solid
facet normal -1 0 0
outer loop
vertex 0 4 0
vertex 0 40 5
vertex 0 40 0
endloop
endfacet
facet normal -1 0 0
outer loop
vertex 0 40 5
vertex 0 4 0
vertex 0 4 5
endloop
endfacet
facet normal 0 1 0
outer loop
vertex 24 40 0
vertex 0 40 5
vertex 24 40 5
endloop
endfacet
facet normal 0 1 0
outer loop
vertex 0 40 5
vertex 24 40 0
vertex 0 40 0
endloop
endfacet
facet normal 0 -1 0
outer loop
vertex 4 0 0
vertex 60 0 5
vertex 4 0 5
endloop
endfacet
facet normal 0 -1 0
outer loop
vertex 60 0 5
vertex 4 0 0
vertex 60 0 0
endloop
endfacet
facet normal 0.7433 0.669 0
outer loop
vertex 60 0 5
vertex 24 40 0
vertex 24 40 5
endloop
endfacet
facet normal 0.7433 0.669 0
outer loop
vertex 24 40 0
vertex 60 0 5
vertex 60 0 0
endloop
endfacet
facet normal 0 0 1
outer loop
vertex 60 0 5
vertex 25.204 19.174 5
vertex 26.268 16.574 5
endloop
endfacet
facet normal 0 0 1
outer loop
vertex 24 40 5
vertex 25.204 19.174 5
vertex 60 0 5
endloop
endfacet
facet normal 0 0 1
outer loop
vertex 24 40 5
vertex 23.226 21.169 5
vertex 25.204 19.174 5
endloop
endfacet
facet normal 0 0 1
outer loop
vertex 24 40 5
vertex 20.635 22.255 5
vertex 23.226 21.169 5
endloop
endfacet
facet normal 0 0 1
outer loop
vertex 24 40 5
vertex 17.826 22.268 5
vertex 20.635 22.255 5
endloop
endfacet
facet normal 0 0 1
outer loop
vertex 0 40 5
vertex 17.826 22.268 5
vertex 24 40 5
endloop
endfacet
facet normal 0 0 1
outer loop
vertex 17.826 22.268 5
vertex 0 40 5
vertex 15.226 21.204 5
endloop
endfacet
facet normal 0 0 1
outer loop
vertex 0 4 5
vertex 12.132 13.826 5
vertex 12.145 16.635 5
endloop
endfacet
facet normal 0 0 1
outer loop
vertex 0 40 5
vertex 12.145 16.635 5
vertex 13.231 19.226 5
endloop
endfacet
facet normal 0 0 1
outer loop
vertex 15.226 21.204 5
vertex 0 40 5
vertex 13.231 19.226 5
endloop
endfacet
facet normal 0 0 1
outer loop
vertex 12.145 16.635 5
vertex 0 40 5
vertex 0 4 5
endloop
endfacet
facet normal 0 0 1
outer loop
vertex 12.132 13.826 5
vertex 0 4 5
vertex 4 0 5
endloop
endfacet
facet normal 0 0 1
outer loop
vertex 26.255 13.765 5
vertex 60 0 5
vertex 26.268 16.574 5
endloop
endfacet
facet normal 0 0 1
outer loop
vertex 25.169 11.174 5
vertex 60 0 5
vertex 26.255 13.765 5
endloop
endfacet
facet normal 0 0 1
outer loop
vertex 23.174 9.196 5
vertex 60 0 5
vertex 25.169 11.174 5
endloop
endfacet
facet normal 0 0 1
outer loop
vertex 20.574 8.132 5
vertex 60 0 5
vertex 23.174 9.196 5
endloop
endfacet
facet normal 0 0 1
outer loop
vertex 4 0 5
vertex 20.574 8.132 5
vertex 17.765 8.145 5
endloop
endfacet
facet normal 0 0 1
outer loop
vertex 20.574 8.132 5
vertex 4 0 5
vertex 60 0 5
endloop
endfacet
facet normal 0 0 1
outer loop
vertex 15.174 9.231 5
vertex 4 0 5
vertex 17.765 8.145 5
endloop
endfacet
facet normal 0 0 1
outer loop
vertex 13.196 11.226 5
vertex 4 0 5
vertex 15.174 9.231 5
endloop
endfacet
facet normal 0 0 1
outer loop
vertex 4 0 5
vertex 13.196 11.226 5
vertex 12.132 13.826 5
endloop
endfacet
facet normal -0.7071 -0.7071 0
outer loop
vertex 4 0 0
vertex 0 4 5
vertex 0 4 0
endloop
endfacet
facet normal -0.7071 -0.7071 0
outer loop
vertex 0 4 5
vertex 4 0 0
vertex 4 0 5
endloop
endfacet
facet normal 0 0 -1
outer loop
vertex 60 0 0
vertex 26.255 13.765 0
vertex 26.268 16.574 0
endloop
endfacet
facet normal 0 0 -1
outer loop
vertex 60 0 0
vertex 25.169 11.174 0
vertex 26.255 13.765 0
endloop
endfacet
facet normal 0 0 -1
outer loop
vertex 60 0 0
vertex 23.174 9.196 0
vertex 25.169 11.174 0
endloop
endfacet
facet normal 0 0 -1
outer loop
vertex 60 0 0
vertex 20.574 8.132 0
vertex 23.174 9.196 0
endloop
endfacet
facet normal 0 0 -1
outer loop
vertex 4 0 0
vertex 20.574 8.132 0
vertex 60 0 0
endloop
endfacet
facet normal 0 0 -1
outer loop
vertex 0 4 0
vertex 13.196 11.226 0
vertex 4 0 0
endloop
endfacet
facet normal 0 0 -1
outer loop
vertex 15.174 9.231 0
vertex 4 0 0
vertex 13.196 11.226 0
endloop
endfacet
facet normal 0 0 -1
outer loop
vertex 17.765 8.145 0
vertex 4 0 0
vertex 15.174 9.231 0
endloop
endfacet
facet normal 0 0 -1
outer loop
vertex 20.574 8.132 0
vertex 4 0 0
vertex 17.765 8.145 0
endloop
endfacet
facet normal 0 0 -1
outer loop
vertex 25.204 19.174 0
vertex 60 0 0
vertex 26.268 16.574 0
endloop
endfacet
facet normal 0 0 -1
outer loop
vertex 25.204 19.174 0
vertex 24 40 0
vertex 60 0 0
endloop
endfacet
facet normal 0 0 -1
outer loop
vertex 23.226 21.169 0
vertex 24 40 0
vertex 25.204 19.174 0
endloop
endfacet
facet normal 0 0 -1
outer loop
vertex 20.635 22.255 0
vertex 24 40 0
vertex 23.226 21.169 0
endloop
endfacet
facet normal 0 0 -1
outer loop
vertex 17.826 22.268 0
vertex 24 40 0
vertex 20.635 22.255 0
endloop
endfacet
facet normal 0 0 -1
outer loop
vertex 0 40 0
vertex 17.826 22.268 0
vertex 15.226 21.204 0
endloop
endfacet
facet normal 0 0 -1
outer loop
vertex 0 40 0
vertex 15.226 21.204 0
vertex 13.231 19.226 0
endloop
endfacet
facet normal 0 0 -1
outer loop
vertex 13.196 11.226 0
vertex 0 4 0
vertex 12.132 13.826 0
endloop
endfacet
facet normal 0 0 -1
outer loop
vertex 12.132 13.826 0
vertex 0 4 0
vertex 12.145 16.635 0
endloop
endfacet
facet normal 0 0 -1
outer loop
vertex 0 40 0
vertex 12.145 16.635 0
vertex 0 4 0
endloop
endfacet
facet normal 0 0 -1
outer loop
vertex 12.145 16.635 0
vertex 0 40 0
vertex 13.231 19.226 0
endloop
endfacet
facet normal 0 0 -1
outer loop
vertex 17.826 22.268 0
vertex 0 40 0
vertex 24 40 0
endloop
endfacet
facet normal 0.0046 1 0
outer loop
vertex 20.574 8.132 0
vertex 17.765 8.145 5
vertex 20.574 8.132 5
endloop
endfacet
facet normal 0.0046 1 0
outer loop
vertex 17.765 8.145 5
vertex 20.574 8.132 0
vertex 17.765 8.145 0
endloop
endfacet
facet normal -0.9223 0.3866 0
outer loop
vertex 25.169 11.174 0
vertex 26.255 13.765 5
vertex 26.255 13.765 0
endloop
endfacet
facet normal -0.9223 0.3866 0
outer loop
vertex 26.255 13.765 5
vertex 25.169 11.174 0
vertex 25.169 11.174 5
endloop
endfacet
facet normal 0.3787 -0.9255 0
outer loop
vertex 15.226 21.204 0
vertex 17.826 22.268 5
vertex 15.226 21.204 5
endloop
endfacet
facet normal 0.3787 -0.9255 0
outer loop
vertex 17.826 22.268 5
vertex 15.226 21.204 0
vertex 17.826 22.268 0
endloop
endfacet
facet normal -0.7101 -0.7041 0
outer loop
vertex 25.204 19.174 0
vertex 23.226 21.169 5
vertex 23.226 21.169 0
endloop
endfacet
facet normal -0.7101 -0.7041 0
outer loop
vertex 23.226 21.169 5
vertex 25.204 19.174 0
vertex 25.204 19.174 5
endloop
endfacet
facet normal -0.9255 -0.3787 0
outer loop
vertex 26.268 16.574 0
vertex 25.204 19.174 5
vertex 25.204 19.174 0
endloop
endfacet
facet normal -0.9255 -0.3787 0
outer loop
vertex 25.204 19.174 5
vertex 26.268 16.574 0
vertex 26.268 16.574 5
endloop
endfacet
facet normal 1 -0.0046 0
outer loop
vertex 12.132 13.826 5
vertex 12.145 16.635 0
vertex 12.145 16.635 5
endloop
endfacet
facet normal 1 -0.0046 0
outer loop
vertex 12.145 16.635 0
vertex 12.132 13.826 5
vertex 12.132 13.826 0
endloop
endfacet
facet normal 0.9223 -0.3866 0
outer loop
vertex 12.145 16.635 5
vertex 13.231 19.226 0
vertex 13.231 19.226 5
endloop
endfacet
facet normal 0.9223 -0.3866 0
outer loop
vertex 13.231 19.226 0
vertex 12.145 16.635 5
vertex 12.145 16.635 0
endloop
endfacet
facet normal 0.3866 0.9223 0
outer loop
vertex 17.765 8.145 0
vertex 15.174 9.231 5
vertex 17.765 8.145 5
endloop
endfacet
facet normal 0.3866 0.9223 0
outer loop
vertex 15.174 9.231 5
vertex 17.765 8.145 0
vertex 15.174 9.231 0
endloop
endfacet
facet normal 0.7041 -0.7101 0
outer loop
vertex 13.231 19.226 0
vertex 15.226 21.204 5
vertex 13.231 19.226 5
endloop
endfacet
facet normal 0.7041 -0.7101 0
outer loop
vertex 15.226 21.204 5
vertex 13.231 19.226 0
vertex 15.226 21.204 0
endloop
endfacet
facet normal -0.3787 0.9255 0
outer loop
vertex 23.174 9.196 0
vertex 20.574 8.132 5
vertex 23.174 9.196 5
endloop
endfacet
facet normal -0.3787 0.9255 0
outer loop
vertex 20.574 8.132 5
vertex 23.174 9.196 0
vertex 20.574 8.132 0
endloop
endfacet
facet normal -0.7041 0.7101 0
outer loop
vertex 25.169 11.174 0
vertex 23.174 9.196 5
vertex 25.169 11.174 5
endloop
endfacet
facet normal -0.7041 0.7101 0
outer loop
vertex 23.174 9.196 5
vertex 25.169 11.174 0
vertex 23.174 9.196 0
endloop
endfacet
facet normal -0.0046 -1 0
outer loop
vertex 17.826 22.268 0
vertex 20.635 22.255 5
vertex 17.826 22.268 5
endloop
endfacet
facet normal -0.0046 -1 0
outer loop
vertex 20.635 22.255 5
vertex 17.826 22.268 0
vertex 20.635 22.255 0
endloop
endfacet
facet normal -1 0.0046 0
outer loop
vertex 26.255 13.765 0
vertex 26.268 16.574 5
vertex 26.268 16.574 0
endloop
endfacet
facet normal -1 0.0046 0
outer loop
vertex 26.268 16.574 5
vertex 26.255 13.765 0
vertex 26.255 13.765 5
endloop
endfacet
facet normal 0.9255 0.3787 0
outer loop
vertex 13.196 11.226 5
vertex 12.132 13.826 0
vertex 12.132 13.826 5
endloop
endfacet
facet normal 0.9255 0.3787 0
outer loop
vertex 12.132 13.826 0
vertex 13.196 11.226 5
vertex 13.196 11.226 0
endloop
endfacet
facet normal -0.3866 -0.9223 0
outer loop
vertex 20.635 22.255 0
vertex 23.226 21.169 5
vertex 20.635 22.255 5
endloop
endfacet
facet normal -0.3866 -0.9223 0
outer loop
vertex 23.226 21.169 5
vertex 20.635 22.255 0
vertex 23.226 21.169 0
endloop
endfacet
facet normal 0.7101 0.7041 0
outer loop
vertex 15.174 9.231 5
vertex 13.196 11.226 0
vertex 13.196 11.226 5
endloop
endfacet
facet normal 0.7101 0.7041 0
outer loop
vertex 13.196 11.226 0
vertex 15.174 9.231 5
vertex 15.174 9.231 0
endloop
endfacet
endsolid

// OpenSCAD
$fn = 32;

// ----------------------------------------------------------------------
// Bracket plate: gusset 60 x 40
// ----------------------------------------------------------------------

// --- parameters (mm) ---
hole_r = 4;               // bolt hole radius
plate_t = 5;              // plate thickness, Z (extrusion height)
gus_a = 60;               // base length
gus_b = 40;               // height
top_x = 24;               // top edge X of the angled cut
light_r = 7.2;            // lightening hole radius

light_d = 2 * light_r;

profile = [[4, 0], [30, 0], [60, 0], [24, 40], [0, 40], [0, 4]];  // primary outline, 6 points, counter clockwise
void_1 = [[26.268, 16.574], [25.204, 19.174], [23.226, 21.169], [20.635, 22.255], [17.826, 22.268], [15.226, 21.204], [13.231, 19.226], [12.145, 16.635], [12.132, 13.826], [13.196, 11.226], [15.174, 9.231], [17.765, 8.145], [20.574, 8.132], [23.174, 9.196], [25.169, 11.174], [26.255, 13.765]];  // lightening hole, 16 points

// --- the one profile operation ---
difference() {
  linear_extrude(height = plate_t) polygon(points = profile);
  translate([0, 0, -1])
    linear_extrude(height = plate_t + 2) polygon(points = void_1);
}
